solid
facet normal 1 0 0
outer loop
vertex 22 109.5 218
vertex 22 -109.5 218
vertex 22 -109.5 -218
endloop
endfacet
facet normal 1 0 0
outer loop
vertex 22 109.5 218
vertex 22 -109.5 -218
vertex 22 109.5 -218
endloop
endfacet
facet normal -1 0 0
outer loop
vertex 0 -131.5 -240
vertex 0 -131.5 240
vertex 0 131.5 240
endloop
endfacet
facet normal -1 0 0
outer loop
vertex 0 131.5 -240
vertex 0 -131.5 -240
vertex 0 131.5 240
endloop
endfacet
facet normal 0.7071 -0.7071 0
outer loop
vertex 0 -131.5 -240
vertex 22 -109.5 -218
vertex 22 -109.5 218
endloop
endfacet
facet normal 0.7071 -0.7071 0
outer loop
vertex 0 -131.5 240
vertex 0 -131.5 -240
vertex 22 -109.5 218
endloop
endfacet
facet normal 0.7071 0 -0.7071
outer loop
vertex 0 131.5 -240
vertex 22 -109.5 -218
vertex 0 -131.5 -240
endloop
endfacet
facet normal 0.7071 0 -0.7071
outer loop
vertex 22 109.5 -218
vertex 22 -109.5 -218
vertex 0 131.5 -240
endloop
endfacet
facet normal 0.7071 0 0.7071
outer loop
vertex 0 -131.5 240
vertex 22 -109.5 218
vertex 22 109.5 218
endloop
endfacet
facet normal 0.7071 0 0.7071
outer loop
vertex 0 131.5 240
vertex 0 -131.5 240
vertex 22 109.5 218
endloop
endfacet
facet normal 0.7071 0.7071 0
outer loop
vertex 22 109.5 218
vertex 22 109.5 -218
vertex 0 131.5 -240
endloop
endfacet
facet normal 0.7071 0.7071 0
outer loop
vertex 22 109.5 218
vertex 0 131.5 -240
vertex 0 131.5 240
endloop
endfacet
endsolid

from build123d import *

# Parameters (mm, degrees)
F0_W     = 263
F0_H     = 480
F1_DEPTH = 22
F2_SIZE  = 21.99999


# Not quite as in the source:
# - a fillet or chamfer is up to 0.001 mm smaller than in the source, because OpenCascade refuses the exact size


with BuildPart() as f1:
    # F0 (on Right) → F1 (new body)
    with BuildSketch(Plane.YZ):
        Rectangle(F0_W, F0_H)
    extrude(amount=F1_DEPTH)

    # F2 (size 22 in the source; OpenCascade refuses exactly that, so slightly less here)
    f2_edges = [f1.edges().sort_by_distance(p)[0] for p in [
        (22, -131.5, 0),
        (22, 0, -240),
        (22, 131.5, 0),
        (22, 0, 240),
    ]]
    chamfer(f2_edges, length=F2_SIZE)


solid = f1.part
